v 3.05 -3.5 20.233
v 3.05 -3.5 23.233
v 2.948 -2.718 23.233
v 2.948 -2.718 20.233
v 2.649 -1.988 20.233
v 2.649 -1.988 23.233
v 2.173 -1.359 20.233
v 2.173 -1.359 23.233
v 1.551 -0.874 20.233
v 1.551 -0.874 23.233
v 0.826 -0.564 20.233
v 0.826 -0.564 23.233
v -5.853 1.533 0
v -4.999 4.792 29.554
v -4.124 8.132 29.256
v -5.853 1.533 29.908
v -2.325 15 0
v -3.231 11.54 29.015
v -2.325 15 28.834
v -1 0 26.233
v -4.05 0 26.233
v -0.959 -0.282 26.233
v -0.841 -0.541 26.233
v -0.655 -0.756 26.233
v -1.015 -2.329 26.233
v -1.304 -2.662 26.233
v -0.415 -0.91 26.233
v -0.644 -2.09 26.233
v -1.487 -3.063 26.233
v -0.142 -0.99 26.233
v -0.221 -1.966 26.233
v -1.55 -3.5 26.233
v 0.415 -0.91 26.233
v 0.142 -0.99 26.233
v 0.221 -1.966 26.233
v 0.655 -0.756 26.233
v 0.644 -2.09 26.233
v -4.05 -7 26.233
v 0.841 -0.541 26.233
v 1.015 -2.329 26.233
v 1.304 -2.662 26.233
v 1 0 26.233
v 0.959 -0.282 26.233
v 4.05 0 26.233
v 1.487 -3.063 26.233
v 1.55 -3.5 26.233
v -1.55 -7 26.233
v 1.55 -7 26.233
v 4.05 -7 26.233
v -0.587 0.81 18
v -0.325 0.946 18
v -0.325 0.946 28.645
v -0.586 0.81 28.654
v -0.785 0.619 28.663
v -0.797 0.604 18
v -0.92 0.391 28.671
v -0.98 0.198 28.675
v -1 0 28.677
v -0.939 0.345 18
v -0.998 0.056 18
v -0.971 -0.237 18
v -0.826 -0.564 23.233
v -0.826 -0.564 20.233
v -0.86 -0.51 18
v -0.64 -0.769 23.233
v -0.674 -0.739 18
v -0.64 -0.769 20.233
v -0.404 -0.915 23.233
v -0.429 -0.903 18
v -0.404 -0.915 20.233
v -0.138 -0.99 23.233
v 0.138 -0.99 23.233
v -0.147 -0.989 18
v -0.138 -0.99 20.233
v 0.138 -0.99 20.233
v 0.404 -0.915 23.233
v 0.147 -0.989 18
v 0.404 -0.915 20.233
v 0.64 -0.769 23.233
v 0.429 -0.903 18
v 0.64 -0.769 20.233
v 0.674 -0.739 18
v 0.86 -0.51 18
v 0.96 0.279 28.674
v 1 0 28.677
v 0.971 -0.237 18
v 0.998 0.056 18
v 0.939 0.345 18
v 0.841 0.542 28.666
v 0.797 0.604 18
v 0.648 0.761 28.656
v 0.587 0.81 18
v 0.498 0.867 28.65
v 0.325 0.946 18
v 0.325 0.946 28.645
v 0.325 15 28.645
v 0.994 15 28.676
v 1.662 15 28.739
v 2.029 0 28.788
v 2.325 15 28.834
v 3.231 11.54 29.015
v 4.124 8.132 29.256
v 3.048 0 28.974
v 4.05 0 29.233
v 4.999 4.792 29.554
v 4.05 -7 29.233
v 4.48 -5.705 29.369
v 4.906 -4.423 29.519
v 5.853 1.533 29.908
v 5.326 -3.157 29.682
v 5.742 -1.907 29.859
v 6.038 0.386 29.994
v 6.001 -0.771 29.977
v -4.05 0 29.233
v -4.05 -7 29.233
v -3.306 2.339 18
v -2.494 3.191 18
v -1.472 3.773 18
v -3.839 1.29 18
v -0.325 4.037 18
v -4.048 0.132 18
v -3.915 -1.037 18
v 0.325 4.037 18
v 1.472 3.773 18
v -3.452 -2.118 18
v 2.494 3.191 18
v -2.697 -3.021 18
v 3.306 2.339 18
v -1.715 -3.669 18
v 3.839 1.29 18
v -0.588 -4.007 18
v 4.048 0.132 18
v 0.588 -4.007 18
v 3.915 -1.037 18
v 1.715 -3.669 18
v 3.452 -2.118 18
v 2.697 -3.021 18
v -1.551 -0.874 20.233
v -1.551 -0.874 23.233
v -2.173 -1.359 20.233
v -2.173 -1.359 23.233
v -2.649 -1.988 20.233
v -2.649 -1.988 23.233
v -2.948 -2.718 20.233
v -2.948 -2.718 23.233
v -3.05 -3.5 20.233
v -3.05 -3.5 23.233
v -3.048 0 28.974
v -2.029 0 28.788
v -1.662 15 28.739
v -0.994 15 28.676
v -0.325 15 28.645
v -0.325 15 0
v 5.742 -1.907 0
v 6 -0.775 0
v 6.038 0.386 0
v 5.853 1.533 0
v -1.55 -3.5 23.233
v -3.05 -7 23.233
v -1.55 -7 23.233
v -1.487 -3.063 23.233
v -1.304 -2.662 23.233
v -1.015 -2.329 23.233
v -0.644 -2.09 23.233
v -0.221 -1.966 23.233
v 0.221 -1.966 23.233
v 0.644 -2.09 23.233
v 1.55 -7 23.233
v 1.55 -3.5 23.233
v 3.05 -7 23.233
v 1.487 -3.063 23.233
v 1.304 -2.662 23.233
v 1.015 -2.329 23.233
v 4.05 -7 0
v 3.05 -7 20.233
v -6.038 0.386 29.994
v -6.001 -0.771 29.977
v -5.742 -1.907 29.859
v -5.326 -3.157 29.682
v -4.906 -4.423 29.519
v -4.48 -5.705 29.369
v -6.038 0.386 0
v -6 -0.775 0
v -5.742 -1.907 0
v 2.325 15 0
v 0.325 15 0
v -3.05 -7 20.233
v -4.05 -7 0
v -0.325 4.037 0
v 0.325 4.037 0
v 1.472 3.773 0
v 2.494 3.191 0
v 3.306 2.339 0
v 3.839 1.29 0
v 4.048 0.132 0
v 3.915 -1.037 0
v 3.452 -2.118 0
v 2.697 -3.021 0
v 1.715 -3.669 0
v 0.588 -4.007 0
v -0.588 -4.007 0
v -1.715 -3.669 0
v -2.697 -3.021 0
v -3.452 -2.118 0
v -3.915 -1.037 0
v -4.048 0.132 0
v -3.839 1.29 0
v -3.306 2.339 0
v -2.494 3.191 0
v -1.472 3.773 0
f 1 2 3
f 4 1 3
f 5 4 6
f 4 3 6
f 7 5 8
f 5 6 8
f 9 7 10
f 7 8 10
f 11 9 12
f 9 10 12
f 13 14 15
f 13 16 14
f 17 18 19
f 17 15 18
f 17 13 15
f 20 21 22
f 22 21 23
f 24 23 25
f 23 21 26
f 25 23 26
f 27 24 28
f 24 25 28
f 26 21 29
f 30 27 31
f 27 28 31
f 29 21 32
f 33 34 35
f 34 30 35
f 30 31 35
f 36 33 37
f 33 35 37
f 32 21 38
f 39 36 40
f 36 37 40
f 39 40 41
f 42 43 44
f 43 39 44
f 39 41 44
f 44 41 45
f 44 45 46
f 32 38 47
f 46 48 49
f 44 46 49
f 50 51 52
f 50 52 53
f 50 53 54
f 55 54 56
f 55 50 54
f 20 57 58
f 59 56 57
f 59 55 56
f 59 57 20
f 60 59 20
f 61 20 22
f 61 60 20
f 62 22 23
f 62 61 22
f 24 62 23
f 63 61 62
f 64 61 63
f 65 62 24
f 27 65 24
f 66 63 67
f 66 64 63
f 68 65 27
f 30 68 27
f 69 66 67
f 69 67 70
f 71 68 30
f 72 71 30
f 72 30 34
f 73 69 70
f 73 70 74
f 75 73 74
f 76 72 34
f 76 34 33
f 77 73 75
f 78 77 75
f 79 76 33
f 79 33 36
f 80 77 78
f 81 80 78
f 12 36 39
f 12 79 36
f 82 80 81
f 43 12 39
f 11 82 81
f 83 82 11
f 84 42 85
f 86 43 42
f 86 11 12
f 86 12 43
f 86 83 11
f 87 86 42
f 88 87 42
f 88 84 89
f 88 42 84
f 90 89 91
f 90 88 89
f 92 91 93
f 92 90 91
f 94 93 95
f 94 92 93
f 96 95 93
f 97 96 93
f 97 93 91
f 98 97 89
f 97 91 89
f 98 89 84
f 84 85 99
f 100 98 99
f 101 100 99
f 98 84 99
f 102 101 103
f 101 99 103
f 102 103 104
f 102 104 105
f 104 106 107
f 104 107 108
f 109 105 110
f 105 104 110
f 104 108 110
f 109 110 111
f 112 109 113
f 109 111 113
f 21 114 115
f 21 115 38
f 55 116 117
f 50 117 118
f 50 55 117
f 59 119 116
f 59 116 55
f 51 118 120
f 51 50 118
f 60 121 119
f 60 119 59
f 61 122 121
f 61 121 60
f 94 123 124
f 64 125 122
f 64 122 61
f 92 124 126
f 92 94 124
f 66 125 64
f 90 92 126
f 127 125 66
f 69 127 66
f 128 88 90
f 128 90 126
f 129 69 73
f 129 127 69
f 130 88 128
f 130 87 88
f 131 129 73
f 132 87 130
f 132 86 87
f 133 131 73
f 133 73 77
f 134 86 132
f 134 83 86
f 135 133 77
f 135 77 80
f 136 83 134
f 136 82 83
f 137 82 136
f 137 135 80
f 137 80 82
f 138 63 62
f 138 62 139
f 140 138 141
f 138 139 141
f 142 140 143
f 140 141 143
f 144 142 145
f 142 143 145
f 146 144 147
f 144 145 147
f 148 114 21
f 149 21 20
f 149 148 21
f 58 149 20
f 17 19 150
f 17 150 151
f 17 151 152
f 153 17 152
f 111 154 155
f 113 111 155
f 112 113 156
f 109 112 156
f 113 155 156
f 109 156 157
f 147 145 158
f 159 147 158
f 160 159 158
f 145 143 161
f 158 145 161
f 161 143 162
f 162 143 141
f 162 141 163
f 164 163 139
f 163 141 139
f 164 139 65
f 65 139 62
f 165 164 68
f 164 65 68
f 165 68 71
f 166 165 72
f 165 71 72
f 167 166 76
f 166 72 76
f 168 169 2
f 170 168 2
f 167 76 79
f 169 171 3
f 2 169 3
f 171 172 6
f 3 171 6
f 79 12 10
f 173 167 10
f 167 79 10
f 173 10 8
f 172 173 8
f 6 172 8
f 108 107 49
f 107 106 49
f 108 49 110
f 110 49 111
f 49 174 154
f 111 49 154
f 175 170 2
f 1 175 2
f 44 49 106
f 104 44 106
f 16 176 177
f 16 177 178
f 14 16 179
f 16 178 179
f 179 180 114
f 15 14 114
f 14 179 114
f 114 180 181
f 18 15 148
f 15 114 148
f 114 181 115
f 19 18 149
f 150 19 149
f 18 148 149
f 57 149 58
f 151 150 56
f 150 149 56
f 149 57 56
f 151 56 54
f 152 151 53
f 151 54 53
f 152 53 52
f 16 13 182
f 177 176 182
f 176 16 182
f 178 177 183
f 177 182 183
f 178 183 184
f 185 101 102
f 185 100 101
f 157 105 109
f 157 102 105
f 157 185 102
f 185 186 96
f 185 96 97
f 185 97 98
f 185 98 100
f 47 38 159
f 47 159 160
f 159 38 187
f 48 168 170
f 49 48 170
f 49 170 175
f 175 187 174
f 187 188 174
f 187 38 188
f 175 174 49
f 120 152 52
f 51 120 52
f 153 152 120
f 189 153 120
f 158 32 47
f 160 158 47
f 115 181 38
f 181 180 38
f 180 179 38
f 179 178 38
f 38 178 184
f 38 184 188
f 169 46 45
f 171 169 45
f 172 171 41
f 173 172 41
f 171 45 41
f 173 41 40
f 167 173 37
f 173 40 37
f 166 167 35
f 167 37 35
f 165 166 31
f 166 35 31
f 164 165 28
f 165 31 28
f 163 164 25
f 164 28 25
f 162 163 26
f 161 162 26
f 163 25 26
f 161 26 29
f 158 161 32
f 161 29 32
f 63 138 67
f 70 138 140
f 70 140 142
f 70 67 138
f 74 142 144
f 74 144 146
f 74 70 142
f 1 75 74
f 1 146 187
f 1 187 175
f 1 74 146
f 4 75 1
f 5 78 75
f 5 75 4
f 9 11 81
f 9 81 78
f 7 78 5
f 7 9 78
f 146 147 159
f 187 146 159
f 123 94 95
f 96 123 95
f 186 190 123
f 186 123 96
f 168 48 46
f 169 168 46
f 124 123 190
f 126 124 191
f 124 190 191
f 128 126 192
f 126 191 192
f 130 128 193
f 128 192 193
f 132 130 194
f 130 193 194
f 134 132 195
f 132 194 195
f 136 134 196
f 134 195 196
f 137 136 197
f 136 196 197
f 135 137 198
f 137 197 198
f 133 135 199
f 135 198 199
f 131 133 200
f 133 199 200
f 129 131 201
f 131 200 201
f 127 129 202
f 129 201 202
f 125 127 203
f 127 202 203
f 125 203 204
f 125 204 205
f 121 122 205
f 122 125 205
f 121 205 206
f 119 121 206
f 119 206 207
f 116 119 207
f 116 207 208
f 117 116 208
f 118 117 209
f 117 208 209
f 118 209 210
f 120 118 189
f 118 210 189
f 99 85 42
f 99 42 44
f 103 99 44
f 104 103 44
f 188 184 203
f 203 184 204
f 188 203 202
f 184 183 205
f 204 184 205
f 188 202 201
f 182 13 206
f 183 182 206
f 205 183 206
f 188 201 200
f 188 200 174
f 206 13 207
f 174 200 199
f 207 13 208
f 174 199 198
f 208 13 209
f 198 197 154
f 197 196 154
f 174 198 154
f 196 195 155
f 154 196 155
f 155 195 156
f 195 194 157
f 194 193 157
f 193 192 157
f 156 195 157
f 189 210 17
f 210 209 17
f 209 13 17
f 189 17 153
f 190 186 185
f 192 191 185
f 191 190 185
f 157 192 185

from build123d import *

# Parameters (mm, degrees)
EXTRUDE_DEPTH   = 30
POCKET_DEPTH    = 22.001
POCKET001_DEPTH = 7
POCKET002_DEPTH = 3
POCKET003_DEPTH = 3
SKETCH005_R     = 4.05
POCKET004_DEPTH = 18


with BuildPart() as part:
    # Sketch → Extrude (new body)
    with BuildSketch(Plane.XY):
        with BuildLine():
            ThreePointArc((-5.852556, 1.533), (-6.046854, -0.195073), (-5.741579, -1.907031))
            Line((-5.741579, -1.907031), (-4.05, -7))
            Line((-4.05, -7), (4.05, -7))
            Line((4.05, -7), (5.741579, -1.907031))
            ThreePointArc((5.741579, -1.907031), (6.046854, -0.195073), (5.852556, 1.533))
            Line((2.325, 15), (5.852556, 1.533))
            Line((0.325, 15), (2.325, 15))
            Line((0.325, 0.945714), (0.325, 15))
            ThreePointArc((-0.325, 0.945714), (0, -1), (0.325, 0.945714))
            Line((-0.325, 15), (-0.325, 0.945714))
            Line((-2.325, 15), (-0.325, 15))
            Line((-5.852556, 1.533), (-2.325, 15))
        make_face()
    extrude(amount=EXTRUDE_DEPTH)

    # Sketch001 → Pocket (cut, through all)
    with BuildSketch(Plane.XZ.offset(7)):
        with BuildLine():
            Line((-6.05, 30), (0, 30))
            Line((0, 30), (6.05, 30))
            ThreePointArc((-6.05, 30), (0, 28.641403), (6.05, 30))
        make_face()
    extrude(amount=-POCKET_DEPTH, mode=Mode.SUBTRACT)

    # Sketch002 → Pocket001 (cut)
    with BuildSketch(Plane.XZ.offset(7)):
        with BuildLine():
            Line((-4.05, 29.23338), (-4.05, 26.23338))
            Line((-4.05, 26.23338), (4.05, 26.23338))
            Line((4.05, 26.23338), (4.05, 29.23338))
            ThreePointArc((-4.05, 29.23338), (0, 28.641403), (4.05, 29.23338))
        make_face()
    extrude(amount=-POCKET001_DEPTH, mode=Mode.SUBTRACT)

    # Sketch003 → Pocket002 (cut)
    with BuildSketch(Plane.XY.offset(26.23338)):
        with BuildLine():
            ThreePointArc((1.55, -3.5), (0, -1.95), (-1.55, -3.5))
            Line((-1.55, -3.5), (-1.55, -7))
            Line((-1.55, -7), (1.55, -7))
            Line((1.55, -7), (1.55, -3.5))
        make_face()
    extrude(amount=-POCKET002_DEPTH, mode=Mode.SUBTRACT)

    # Sketch004 → Pocket003 (cut)
    with BuildSketch(Plane.XY.offset(23.23338)):
        with BuildLine():
            ThreePointArc((3.05, -3.5), (0, -0.45), (-3.05, -3.5))
            Line((-3.05, -3.5), (-3.05, -7))
            Line((-3.05, -7), (3.05, -7))
            Line((3.05, -7), (3.05, -3.5))
        make_face()
    extrude(amount=-POCKET003_DEPTH, mode=Mode.SUBTRACT)

    # Sketch005 → Pocket004 (cut)
    with BuildSketch(Plane(origin=(0, 0, 0), x_dir=(1, 0, 0), z_dir=(0, 0, -1))):
        Circle(SKETCH005_R)
    extrude(amount=-POCKET004_DEPTH, mode=Mode.SUBTRACT)


solid = part.part
